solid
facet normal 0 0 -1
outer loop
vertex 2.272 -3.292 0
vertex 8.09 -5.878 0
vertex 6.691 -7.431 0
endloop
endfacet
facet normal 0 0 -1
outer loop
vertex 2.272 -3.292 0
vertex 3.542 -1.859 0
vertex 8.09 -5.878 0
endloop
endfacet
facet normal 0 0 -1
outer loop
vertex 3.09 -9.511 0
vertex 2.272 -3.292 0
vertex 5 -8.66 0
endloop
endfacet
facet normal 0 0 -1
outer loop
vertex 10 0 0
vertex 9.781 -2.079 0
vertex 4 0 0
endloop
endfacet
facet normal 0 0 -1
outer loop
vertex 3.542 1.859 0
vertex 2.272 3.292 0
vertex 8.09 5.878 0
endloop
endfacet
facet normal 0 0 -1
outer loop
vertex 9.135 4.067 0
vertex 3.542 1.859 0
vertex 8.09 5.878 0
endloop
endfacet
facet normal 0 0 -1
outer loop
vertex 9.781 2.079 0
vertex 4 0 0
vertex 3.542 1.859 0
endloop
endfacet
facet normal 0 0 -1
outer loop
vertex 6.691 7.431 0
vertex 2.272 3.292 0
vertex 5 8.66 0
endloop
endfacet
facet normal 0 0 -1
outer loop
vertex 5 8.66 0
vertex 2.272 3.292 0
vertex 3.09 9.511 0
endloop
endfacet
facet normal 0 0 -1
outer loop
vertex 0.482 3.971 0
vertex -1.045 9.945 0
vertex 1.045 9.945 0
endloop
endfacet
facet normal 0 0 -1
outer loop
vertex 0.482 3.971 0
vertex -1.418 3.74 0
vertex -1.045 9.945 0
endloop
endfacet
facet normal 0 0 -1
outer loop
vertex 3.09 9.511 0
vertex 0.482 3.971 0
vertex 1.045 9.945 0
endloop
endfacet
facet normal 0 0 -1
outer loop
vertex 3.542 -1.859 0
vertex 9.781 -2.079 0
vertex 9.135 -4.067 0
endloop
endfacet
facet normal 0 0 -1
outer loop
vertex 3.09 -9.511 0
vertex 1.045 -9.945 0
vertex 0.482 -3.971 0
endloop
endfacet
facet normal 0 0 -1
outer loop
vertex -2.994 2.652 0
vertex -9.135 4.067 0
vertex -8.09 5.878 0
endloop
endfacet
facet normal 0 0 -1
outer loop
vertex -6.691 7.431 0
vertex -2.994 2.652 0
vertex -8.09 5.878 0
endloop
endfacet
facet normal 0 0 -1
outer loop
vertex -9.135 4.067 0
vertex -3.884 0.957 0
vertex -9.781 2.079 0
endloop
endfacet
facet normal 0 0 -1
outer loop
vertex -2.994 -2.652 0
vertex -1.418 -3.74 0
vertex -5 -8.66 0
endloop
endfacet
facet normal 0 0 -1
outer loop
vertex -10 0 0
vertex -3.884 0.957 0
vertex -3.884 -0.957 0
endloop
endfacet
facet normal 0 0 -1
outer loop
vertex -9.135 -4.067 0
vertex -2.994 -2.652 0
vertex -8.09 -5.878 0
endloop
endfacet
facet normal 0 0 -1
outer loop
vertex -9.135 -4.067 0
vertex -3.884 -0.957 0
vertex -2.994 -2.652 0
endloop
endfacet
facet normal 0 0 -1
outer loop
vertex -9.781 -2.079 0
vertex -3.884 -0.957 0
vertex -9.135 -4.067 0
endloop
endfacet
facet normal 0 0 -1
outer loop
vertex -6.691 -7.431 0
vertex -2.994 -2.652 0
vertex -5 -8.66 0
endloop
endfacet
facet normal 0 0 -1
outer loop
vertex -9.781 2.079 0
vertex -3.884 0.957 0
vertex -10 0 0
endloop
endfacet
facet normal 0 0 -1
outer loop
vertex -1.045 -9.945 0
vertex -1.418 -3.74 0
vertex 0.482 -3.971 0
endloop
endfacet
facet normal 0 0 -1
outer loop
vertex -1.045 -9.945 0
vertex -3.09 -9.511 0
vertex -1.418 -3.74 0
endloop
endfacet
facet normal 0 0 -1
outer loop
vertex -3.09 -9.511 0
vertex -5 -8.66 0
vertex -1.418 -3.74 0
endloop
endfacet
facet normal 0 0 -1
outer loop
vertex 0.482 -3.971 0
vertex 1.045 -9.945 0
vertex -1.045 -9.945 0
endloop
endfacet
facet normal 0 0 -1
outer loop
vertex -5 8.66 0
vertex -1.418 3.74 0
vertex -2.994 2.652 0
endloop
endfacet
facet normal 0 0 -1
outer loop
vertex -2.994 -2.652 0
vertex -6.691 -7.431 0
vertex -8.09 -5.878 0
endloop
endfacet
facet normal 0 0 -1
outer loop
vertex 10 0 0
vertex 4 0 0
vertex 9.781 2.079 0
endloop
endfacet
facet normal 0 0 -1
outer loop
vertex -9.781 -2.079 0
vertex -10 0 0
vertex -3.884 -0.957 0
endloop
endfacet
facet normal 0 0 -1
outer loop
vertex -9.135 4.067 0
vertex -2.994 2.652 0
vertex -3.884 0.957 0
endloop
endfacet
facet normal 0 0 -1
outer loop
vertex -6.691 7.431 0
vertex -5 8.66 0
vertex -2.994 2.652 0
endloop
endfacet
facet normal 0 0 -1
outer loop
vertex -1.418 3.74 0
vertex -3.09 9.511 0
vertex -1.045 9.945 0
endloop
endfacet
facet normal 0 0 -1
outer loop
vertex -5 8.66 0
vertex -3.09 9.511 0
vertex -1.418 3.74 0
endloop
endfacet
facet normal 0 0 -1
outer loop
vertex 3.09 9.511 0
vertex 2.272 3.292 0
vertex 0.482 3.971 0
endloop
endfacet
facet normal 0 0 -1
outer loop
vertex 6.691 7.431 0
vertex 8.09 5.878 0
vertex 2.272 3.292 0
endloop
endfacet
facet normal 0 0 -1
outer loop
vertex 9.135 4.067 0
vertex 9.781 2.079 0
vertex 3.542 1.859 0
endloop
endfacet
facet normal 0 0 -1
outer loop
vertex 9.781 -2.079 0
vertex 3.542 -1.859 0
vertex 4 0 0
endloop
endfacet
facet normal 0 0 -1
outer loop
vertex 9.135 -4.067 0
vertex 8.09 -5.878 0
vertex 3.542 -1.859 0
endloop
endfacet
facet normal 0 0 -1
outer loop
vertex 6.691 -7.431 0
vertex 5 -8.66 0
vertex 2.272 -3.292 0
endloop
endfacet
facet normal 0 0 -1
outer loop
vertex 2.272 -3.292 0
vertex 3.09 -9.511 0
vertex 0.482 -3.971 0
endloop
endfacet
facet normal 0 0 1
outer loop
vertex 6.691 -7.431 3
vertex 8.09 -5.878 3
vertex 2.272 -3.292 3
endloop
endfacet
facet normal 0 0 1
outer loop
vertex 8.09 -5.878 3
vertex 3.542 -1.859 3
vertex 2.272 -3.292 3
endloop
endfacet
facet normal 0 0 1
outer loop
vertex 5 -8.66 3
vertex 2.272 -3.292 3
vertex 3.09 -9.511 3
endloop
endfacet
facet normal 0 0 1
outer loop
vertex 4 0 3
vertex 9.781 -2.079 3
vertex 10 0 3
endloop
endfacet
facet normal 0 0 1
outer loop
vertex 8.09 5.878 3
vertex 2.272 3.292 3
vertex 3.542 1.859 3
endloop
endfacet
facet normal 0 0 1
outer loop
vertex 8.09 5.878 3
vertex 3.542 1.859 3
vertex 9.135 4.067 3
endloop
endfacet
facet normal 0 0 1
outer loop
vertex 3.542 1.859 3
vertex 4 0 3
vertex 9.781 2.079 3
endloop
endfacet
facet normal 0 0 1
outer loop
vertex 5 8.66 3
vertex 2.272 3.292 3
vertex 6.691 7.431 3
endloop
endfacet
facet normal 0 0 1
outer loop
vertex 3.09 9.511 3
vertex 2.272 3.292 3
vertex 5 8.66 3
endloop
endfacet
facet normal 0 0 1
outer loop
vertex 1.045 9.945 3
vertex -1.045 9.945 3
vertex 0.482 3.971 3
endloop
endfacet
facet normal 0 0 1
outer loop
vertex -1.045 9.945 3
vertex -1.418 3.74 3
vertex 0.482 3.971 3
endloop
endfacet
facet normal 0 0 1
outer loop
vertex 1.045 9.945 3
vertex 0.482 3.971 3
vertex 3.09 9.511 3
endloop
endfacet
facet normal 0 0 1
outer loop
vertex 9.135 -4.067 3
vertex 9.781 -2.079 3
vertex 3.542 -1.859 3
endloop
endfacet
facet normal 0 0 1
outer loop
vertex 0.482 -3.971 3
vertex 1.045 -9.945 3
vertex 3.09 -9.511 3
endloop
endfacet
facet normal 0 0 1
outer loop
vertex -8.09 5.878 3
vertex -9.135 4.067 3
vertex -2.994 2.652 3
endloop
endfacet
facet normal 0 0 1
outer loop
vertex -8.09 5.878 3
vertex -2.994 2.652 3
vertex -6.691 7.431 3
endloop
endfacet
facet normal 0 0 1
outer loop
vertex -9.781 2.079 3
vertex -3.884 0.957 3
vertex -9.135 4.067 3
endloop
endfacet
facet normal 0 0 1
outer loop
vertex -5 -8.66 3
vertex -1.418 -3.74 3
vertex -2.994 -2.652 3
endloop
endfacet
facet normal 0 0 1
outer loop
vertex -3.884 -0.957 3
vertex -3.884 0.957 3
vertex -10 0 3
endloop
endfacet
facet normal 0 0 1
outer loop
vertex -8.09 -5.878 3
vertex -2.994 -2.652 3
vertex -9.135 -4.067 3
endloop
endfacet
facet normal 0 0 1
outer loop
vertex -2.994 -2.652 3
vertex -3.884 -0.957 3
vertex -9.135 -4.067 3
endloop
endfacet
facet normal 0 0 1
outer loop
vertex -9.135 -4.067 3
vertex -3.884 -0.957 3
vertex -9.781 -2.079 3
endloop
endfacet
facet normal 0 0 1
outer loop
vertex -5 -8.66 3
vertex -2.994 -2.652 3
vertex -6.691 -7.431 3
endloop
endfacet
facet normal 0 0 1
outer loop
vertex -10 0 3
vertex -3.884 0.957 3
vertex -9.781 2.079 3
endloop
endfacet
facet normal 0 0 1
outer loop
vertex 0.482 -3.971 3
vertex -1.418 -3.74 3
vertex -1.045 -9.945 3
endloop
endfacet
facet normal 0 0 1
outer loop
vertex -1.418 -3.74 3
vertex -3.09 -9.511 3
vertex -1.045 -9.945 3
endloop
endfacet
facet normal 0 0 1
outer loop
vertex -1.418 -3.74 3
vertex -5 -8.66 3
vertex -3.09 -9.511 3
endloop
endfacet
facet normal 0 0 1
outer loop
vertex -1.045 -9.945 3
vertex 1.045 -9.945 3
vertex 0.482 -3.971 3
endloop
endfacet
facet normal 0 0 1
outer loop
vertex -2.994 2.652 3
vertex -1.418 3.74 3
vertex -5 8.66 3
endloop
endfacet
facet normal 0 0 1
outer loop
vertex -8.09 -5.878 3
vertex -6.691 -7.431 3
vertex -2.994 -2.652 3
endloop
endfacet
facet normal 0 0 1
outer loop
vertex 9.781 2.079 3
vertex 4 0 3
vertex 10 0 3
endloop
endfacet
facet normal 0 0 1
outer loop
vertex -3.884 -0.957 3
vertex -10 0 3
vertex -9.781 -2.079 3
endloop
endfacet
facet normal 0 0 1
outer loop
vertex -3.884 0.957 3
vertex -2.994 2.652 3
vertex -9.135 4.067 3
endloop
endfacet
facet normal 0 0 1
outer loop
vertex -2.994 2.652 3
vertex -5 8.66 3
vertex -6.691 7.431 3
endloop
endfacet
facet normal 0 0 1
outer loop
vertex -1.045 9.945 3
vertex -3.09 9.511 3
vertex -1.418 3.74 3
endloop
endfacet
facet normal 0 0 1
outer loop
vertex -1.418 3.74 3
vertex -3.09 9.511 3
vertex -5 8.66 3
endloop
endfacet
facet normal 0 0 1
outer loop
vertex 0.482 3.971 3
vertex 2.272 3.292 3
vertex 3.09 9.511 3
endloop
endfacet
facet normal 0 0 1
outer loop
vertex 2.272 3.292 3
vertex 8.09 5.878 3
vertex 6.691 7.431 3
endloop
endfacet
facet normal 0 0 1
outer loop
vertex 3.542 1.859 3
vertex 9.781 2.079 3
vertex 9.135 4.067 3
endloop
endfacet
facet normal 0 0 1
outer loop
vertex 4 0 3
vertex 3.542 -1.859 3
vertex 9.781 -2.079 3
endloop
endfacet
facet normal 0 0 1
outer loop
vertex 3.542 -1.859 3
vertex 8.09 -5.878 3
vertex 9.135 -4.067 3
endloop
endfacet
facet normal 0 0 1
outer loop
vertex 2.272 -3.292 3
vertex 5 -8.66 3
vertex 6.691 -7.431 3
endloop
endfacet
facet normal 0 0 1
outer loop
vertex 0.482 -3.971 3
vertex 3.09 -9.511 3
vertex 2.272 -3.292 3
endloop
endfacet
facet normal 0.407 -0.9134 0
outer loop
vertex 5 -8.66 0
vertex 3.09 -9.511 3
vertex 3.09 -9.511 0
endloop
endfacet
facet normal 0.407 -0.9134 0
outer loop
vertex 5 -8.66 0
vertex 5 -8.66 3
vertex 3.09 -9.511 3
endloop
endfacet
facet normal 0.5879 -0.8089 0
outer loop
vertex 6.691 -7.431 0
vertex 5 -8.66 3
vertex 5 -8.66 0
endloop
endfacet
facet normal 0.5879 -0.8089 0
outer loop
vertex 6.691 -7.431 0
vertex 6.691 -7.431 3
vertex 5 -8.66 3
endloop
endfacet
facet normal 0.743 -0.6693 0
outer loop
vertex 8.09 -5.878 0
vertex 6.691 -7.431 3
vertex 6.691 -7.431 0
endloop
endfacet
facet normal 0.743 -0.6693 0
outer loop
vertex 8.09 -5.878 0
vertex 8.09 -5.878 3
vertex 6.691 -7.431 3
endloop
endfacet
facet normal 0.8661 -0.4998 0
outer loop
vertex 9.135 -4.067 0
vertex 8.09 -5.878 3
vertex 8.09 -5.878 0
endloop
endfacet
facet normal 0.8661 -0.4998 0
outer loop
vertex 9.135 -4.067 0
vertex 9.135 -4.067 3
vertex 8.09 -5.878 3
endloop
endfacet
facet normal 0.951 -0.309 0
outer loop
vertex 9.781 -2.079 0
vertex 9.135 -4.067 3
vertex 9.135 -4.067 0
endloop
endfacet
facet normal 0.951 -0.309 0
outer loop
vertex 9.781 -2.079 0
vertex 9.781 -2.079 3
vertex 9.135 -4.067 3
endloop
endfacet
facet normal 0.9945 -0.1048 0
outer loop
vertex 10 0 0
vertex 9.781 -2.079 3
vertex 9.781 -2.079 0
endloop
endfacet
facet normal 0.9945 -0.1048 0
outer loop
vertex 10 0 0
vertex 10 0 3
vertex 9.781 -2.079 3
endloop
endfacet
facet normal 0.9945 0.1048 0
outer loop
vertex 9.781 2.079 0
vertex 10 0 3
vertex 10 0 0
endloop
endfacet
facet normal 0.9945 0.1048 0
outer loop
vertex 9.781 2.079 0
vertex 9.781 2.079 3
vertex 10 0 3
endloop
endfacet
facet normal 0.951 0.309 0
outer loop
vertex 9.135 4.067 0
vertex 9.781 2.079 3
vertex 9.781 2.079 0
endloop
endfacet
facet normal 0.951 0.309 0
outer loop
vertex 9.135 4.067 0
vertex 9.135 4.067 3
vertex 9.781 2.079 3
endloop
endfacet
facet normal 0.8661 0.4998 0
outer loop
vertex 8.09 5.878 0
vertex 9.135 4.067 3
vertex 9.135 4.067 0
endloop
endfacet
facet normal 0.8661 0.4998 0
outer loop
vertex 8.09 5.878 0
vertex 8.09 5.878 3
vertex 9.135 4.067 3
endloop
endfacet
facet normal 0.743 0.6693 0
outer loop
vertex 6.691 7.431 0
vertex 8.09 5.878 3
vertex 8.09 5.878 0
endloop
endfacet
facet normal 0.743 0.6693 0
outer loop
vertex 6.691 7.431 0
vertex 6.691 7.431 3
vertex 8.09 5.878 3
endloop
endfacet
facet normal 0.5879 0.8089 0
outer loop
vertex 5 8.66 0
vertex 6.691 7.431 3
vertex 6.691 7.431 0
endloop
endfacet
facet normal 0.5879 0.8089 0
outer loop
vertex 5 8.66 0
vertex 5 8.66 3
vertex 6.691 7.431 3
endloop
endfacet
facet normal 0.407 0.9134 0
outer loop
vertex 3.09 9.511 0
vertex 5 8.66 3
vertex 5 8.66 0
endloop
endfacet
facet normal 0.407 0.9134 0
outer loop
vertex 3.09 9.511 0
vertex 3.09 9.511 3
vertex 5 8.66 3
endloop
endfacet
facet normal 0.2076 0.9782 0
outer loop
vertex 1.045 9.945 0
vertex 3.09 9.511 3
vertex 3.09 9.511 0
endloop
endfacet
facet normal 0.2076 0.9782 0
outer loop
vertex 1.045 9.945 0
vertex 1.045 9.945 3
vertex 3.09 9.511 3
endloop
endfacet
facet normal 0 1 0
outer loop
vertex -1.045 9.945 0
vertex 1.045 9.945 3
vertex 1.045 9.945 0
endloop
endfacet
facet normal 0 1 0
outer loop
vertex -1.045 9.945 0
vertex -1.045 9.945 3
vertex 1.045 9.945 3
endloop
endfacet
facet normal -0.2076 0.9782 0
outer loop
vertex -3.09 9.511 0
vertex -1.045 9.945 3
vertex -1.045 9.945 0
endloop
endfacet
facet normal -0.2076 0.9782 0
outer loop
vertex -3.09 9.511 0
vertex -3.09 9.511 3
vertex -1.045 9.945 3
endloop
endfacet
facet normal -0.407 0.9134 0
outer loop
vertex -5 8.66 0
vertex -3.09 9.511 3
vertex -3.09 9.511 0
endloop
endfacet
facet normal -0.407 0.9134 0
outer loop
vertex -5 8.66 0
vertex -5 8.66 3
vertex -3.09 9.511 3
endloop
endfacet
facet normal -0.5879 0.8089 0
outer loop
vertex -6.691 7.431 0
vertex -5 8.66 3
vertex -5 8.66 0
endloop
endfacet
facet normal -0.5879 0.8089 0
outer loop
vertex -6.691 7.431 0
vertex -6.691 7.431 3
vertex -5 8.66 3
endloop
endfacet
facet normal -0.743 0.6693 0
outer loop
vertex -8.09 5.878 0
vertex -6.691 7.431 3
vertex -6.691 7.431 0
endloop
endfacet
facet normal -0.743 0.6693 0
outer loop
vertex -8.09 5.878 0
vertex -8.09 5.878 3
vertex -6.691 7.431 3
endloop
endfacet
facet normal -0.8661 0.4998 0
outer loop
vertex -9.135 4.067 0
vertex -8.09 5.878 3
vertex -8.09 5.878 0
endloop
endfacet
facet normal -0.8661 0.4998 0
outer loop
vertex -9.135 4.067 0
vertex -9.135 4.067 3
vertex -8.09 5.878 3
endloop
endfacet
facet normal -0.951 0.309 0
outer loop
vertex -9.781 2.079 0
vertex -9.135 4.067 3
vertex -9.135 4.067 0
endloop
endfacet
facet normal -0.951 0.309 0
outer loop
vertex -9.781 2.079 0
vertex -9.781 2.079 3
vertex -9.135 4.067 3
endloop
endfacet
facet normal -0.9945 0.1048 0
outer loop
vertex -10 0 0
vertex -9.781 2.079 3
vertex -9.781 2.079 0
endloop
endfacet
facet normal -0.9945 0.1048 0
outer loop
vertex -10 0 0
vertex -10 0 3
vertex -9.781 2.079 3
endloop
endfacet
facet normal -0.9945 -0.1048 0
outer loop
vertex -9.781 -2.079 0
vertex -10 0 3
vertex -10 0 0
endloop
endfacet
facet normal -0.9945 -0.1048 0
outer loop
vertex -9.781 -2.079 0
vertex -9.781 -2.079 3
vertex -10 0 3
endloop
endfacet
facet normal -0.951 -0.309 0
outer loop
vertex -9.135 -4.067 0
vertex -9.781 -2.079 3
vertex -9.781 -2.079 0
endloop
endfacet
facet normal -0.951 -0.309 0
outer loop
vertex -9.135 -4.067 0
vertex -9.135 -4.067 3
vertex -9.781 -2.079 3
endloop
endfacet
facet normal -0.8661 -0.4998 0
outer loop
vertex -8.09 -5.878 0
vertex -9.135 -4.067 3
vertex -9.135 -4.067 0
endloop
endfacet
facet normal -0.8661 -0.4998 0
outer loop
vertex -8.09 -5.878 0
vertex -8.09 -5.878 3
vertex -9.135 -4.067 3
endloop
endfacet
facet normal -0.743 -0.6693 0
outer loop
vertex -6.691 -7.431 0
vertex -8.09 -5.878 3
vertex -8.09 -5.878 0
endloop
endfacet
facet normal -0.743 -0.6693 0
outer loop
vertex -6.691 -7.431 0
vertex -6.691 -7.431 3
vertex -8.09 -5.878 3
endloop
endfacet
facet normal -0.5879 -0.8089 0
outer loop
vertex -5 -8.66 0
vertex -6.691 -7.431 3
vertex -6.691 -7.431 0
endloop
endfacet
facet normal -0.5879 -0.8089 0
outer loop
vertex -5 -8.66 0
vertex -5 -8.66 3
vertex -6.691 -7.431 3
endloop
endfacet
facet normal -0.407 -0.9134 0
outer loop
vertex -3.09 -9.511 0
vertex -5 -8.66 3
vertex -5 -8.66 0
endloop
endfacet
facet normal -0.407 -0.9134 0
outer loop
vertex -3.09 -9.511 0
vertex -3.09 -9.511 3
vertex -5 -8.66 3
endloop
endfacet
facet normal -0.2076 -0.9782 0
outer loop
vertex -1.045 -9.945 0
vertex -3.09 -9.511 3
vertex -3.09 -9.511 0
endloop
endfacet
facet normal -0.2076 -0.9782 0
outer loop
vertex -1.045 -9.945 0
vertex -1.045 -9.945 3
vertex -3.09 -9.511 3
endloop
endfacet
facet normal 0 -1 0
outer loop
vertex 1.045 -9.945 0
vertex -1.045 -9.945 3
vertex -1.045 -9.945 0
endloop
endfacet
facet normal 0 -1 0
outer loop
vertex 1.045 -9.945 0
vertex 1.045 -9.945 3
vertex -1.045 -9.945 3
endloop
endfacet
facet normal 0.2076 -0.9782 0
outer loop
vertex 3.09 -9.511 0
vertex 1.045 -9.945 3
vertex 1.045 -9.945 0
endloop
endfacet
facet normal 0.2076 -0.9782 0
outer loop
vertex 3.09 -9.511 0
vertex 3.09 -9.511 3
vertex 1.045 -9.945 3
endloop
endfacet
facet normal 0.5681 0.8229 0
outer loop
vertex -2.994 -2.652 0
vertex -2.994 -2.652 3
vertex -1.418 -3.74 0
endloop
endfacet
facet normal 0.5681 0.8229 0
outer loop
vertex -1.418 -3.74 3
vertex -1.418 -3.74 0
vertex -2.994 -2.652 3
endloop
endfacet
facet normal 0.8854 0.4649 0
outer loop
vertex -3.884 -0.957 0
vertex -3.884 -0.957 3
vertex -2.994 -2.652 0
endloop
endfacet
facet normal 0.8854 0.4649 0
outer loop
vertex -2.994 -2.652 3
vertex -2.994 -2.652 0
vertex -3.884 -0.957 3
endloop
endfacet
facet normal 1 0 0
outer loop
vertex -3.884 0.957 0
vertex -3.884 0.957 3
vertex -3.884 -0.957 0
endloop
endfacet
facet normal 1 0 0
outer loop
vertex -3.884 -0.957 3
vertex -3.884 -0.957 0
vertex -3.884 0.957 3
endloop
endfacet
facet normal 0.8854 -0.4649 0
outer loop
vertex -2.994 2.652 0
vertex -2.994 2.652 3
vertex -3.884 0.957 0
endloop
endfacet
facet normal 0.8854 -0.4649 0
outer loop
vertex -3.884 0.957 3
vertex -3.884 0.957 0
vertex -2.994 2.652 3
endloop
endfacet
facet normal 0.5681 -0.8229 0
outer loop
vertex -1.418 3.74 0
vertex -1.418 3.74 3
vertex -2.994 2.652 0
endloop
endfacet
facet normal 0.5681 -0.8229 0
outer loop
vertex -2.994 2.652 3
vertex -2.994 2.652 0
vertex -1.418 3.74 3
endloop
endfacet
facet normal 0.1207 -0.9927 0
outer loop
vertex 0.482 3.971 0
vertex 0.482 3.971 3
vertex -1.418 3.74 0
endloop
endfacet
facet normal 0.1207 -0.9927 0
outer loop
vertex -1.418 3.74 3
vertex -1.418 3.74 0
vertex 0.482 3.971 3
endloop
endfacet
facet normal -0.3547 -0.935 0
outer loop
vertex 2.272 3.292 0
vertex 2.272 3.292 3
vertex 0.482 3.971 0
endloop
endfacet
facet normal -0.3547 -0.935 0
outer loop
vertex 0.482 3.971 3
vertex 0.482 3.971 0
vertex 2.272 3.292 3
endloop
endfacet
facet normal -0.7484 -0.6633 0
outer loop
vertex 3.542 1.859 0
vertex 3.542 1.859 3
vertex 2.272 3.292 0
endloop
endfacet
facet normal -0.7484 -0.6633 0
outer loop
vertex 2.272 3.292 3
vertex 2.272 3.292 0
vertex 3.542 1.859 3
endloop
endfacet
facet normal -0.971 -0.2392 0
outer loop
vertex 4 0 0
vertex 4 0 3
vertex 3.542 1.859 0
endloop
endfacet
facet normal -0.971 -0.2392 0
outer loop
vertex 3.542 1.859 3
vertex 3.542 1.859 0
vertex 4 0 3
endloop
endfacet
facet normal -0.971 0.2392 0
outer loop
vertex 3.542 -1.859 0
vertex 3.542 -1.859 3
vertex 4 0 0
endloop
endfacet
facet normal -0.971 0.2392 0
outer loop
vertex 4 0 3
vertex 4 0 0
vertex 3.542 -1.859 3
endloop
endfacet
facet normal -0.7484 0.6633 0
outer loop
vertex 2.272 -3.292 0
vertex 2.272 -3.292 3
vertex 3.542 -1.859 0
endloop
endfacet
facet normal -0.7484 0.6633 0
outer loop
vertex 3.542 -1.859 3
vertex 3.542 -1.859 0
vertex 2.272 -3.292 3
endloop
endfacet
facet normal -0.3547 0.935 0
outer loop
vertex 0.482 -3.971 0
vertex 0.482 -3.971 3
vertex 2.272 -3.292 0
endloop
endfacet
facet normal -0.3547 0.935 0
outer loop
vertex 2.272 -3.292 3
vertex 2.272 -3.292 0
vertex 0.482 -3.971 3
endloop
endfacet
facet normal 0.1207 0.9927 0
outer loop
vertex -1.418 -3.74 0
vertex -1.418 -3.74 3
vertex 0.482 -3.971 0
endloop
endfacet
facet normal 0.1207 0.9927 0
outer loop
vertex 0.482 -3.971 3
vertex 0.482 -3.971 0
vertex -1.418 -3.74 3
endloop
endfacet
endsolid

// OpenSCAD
// Stage 2 of docs/audits/exact-geometry-rust.md: extrusions.
// A washer: a linear_extrude of a circle with a circular hole (two cylinders).
// volume: 791.6813487046279
linear_extrude(3) difference() { circle(10); circle(4); }
